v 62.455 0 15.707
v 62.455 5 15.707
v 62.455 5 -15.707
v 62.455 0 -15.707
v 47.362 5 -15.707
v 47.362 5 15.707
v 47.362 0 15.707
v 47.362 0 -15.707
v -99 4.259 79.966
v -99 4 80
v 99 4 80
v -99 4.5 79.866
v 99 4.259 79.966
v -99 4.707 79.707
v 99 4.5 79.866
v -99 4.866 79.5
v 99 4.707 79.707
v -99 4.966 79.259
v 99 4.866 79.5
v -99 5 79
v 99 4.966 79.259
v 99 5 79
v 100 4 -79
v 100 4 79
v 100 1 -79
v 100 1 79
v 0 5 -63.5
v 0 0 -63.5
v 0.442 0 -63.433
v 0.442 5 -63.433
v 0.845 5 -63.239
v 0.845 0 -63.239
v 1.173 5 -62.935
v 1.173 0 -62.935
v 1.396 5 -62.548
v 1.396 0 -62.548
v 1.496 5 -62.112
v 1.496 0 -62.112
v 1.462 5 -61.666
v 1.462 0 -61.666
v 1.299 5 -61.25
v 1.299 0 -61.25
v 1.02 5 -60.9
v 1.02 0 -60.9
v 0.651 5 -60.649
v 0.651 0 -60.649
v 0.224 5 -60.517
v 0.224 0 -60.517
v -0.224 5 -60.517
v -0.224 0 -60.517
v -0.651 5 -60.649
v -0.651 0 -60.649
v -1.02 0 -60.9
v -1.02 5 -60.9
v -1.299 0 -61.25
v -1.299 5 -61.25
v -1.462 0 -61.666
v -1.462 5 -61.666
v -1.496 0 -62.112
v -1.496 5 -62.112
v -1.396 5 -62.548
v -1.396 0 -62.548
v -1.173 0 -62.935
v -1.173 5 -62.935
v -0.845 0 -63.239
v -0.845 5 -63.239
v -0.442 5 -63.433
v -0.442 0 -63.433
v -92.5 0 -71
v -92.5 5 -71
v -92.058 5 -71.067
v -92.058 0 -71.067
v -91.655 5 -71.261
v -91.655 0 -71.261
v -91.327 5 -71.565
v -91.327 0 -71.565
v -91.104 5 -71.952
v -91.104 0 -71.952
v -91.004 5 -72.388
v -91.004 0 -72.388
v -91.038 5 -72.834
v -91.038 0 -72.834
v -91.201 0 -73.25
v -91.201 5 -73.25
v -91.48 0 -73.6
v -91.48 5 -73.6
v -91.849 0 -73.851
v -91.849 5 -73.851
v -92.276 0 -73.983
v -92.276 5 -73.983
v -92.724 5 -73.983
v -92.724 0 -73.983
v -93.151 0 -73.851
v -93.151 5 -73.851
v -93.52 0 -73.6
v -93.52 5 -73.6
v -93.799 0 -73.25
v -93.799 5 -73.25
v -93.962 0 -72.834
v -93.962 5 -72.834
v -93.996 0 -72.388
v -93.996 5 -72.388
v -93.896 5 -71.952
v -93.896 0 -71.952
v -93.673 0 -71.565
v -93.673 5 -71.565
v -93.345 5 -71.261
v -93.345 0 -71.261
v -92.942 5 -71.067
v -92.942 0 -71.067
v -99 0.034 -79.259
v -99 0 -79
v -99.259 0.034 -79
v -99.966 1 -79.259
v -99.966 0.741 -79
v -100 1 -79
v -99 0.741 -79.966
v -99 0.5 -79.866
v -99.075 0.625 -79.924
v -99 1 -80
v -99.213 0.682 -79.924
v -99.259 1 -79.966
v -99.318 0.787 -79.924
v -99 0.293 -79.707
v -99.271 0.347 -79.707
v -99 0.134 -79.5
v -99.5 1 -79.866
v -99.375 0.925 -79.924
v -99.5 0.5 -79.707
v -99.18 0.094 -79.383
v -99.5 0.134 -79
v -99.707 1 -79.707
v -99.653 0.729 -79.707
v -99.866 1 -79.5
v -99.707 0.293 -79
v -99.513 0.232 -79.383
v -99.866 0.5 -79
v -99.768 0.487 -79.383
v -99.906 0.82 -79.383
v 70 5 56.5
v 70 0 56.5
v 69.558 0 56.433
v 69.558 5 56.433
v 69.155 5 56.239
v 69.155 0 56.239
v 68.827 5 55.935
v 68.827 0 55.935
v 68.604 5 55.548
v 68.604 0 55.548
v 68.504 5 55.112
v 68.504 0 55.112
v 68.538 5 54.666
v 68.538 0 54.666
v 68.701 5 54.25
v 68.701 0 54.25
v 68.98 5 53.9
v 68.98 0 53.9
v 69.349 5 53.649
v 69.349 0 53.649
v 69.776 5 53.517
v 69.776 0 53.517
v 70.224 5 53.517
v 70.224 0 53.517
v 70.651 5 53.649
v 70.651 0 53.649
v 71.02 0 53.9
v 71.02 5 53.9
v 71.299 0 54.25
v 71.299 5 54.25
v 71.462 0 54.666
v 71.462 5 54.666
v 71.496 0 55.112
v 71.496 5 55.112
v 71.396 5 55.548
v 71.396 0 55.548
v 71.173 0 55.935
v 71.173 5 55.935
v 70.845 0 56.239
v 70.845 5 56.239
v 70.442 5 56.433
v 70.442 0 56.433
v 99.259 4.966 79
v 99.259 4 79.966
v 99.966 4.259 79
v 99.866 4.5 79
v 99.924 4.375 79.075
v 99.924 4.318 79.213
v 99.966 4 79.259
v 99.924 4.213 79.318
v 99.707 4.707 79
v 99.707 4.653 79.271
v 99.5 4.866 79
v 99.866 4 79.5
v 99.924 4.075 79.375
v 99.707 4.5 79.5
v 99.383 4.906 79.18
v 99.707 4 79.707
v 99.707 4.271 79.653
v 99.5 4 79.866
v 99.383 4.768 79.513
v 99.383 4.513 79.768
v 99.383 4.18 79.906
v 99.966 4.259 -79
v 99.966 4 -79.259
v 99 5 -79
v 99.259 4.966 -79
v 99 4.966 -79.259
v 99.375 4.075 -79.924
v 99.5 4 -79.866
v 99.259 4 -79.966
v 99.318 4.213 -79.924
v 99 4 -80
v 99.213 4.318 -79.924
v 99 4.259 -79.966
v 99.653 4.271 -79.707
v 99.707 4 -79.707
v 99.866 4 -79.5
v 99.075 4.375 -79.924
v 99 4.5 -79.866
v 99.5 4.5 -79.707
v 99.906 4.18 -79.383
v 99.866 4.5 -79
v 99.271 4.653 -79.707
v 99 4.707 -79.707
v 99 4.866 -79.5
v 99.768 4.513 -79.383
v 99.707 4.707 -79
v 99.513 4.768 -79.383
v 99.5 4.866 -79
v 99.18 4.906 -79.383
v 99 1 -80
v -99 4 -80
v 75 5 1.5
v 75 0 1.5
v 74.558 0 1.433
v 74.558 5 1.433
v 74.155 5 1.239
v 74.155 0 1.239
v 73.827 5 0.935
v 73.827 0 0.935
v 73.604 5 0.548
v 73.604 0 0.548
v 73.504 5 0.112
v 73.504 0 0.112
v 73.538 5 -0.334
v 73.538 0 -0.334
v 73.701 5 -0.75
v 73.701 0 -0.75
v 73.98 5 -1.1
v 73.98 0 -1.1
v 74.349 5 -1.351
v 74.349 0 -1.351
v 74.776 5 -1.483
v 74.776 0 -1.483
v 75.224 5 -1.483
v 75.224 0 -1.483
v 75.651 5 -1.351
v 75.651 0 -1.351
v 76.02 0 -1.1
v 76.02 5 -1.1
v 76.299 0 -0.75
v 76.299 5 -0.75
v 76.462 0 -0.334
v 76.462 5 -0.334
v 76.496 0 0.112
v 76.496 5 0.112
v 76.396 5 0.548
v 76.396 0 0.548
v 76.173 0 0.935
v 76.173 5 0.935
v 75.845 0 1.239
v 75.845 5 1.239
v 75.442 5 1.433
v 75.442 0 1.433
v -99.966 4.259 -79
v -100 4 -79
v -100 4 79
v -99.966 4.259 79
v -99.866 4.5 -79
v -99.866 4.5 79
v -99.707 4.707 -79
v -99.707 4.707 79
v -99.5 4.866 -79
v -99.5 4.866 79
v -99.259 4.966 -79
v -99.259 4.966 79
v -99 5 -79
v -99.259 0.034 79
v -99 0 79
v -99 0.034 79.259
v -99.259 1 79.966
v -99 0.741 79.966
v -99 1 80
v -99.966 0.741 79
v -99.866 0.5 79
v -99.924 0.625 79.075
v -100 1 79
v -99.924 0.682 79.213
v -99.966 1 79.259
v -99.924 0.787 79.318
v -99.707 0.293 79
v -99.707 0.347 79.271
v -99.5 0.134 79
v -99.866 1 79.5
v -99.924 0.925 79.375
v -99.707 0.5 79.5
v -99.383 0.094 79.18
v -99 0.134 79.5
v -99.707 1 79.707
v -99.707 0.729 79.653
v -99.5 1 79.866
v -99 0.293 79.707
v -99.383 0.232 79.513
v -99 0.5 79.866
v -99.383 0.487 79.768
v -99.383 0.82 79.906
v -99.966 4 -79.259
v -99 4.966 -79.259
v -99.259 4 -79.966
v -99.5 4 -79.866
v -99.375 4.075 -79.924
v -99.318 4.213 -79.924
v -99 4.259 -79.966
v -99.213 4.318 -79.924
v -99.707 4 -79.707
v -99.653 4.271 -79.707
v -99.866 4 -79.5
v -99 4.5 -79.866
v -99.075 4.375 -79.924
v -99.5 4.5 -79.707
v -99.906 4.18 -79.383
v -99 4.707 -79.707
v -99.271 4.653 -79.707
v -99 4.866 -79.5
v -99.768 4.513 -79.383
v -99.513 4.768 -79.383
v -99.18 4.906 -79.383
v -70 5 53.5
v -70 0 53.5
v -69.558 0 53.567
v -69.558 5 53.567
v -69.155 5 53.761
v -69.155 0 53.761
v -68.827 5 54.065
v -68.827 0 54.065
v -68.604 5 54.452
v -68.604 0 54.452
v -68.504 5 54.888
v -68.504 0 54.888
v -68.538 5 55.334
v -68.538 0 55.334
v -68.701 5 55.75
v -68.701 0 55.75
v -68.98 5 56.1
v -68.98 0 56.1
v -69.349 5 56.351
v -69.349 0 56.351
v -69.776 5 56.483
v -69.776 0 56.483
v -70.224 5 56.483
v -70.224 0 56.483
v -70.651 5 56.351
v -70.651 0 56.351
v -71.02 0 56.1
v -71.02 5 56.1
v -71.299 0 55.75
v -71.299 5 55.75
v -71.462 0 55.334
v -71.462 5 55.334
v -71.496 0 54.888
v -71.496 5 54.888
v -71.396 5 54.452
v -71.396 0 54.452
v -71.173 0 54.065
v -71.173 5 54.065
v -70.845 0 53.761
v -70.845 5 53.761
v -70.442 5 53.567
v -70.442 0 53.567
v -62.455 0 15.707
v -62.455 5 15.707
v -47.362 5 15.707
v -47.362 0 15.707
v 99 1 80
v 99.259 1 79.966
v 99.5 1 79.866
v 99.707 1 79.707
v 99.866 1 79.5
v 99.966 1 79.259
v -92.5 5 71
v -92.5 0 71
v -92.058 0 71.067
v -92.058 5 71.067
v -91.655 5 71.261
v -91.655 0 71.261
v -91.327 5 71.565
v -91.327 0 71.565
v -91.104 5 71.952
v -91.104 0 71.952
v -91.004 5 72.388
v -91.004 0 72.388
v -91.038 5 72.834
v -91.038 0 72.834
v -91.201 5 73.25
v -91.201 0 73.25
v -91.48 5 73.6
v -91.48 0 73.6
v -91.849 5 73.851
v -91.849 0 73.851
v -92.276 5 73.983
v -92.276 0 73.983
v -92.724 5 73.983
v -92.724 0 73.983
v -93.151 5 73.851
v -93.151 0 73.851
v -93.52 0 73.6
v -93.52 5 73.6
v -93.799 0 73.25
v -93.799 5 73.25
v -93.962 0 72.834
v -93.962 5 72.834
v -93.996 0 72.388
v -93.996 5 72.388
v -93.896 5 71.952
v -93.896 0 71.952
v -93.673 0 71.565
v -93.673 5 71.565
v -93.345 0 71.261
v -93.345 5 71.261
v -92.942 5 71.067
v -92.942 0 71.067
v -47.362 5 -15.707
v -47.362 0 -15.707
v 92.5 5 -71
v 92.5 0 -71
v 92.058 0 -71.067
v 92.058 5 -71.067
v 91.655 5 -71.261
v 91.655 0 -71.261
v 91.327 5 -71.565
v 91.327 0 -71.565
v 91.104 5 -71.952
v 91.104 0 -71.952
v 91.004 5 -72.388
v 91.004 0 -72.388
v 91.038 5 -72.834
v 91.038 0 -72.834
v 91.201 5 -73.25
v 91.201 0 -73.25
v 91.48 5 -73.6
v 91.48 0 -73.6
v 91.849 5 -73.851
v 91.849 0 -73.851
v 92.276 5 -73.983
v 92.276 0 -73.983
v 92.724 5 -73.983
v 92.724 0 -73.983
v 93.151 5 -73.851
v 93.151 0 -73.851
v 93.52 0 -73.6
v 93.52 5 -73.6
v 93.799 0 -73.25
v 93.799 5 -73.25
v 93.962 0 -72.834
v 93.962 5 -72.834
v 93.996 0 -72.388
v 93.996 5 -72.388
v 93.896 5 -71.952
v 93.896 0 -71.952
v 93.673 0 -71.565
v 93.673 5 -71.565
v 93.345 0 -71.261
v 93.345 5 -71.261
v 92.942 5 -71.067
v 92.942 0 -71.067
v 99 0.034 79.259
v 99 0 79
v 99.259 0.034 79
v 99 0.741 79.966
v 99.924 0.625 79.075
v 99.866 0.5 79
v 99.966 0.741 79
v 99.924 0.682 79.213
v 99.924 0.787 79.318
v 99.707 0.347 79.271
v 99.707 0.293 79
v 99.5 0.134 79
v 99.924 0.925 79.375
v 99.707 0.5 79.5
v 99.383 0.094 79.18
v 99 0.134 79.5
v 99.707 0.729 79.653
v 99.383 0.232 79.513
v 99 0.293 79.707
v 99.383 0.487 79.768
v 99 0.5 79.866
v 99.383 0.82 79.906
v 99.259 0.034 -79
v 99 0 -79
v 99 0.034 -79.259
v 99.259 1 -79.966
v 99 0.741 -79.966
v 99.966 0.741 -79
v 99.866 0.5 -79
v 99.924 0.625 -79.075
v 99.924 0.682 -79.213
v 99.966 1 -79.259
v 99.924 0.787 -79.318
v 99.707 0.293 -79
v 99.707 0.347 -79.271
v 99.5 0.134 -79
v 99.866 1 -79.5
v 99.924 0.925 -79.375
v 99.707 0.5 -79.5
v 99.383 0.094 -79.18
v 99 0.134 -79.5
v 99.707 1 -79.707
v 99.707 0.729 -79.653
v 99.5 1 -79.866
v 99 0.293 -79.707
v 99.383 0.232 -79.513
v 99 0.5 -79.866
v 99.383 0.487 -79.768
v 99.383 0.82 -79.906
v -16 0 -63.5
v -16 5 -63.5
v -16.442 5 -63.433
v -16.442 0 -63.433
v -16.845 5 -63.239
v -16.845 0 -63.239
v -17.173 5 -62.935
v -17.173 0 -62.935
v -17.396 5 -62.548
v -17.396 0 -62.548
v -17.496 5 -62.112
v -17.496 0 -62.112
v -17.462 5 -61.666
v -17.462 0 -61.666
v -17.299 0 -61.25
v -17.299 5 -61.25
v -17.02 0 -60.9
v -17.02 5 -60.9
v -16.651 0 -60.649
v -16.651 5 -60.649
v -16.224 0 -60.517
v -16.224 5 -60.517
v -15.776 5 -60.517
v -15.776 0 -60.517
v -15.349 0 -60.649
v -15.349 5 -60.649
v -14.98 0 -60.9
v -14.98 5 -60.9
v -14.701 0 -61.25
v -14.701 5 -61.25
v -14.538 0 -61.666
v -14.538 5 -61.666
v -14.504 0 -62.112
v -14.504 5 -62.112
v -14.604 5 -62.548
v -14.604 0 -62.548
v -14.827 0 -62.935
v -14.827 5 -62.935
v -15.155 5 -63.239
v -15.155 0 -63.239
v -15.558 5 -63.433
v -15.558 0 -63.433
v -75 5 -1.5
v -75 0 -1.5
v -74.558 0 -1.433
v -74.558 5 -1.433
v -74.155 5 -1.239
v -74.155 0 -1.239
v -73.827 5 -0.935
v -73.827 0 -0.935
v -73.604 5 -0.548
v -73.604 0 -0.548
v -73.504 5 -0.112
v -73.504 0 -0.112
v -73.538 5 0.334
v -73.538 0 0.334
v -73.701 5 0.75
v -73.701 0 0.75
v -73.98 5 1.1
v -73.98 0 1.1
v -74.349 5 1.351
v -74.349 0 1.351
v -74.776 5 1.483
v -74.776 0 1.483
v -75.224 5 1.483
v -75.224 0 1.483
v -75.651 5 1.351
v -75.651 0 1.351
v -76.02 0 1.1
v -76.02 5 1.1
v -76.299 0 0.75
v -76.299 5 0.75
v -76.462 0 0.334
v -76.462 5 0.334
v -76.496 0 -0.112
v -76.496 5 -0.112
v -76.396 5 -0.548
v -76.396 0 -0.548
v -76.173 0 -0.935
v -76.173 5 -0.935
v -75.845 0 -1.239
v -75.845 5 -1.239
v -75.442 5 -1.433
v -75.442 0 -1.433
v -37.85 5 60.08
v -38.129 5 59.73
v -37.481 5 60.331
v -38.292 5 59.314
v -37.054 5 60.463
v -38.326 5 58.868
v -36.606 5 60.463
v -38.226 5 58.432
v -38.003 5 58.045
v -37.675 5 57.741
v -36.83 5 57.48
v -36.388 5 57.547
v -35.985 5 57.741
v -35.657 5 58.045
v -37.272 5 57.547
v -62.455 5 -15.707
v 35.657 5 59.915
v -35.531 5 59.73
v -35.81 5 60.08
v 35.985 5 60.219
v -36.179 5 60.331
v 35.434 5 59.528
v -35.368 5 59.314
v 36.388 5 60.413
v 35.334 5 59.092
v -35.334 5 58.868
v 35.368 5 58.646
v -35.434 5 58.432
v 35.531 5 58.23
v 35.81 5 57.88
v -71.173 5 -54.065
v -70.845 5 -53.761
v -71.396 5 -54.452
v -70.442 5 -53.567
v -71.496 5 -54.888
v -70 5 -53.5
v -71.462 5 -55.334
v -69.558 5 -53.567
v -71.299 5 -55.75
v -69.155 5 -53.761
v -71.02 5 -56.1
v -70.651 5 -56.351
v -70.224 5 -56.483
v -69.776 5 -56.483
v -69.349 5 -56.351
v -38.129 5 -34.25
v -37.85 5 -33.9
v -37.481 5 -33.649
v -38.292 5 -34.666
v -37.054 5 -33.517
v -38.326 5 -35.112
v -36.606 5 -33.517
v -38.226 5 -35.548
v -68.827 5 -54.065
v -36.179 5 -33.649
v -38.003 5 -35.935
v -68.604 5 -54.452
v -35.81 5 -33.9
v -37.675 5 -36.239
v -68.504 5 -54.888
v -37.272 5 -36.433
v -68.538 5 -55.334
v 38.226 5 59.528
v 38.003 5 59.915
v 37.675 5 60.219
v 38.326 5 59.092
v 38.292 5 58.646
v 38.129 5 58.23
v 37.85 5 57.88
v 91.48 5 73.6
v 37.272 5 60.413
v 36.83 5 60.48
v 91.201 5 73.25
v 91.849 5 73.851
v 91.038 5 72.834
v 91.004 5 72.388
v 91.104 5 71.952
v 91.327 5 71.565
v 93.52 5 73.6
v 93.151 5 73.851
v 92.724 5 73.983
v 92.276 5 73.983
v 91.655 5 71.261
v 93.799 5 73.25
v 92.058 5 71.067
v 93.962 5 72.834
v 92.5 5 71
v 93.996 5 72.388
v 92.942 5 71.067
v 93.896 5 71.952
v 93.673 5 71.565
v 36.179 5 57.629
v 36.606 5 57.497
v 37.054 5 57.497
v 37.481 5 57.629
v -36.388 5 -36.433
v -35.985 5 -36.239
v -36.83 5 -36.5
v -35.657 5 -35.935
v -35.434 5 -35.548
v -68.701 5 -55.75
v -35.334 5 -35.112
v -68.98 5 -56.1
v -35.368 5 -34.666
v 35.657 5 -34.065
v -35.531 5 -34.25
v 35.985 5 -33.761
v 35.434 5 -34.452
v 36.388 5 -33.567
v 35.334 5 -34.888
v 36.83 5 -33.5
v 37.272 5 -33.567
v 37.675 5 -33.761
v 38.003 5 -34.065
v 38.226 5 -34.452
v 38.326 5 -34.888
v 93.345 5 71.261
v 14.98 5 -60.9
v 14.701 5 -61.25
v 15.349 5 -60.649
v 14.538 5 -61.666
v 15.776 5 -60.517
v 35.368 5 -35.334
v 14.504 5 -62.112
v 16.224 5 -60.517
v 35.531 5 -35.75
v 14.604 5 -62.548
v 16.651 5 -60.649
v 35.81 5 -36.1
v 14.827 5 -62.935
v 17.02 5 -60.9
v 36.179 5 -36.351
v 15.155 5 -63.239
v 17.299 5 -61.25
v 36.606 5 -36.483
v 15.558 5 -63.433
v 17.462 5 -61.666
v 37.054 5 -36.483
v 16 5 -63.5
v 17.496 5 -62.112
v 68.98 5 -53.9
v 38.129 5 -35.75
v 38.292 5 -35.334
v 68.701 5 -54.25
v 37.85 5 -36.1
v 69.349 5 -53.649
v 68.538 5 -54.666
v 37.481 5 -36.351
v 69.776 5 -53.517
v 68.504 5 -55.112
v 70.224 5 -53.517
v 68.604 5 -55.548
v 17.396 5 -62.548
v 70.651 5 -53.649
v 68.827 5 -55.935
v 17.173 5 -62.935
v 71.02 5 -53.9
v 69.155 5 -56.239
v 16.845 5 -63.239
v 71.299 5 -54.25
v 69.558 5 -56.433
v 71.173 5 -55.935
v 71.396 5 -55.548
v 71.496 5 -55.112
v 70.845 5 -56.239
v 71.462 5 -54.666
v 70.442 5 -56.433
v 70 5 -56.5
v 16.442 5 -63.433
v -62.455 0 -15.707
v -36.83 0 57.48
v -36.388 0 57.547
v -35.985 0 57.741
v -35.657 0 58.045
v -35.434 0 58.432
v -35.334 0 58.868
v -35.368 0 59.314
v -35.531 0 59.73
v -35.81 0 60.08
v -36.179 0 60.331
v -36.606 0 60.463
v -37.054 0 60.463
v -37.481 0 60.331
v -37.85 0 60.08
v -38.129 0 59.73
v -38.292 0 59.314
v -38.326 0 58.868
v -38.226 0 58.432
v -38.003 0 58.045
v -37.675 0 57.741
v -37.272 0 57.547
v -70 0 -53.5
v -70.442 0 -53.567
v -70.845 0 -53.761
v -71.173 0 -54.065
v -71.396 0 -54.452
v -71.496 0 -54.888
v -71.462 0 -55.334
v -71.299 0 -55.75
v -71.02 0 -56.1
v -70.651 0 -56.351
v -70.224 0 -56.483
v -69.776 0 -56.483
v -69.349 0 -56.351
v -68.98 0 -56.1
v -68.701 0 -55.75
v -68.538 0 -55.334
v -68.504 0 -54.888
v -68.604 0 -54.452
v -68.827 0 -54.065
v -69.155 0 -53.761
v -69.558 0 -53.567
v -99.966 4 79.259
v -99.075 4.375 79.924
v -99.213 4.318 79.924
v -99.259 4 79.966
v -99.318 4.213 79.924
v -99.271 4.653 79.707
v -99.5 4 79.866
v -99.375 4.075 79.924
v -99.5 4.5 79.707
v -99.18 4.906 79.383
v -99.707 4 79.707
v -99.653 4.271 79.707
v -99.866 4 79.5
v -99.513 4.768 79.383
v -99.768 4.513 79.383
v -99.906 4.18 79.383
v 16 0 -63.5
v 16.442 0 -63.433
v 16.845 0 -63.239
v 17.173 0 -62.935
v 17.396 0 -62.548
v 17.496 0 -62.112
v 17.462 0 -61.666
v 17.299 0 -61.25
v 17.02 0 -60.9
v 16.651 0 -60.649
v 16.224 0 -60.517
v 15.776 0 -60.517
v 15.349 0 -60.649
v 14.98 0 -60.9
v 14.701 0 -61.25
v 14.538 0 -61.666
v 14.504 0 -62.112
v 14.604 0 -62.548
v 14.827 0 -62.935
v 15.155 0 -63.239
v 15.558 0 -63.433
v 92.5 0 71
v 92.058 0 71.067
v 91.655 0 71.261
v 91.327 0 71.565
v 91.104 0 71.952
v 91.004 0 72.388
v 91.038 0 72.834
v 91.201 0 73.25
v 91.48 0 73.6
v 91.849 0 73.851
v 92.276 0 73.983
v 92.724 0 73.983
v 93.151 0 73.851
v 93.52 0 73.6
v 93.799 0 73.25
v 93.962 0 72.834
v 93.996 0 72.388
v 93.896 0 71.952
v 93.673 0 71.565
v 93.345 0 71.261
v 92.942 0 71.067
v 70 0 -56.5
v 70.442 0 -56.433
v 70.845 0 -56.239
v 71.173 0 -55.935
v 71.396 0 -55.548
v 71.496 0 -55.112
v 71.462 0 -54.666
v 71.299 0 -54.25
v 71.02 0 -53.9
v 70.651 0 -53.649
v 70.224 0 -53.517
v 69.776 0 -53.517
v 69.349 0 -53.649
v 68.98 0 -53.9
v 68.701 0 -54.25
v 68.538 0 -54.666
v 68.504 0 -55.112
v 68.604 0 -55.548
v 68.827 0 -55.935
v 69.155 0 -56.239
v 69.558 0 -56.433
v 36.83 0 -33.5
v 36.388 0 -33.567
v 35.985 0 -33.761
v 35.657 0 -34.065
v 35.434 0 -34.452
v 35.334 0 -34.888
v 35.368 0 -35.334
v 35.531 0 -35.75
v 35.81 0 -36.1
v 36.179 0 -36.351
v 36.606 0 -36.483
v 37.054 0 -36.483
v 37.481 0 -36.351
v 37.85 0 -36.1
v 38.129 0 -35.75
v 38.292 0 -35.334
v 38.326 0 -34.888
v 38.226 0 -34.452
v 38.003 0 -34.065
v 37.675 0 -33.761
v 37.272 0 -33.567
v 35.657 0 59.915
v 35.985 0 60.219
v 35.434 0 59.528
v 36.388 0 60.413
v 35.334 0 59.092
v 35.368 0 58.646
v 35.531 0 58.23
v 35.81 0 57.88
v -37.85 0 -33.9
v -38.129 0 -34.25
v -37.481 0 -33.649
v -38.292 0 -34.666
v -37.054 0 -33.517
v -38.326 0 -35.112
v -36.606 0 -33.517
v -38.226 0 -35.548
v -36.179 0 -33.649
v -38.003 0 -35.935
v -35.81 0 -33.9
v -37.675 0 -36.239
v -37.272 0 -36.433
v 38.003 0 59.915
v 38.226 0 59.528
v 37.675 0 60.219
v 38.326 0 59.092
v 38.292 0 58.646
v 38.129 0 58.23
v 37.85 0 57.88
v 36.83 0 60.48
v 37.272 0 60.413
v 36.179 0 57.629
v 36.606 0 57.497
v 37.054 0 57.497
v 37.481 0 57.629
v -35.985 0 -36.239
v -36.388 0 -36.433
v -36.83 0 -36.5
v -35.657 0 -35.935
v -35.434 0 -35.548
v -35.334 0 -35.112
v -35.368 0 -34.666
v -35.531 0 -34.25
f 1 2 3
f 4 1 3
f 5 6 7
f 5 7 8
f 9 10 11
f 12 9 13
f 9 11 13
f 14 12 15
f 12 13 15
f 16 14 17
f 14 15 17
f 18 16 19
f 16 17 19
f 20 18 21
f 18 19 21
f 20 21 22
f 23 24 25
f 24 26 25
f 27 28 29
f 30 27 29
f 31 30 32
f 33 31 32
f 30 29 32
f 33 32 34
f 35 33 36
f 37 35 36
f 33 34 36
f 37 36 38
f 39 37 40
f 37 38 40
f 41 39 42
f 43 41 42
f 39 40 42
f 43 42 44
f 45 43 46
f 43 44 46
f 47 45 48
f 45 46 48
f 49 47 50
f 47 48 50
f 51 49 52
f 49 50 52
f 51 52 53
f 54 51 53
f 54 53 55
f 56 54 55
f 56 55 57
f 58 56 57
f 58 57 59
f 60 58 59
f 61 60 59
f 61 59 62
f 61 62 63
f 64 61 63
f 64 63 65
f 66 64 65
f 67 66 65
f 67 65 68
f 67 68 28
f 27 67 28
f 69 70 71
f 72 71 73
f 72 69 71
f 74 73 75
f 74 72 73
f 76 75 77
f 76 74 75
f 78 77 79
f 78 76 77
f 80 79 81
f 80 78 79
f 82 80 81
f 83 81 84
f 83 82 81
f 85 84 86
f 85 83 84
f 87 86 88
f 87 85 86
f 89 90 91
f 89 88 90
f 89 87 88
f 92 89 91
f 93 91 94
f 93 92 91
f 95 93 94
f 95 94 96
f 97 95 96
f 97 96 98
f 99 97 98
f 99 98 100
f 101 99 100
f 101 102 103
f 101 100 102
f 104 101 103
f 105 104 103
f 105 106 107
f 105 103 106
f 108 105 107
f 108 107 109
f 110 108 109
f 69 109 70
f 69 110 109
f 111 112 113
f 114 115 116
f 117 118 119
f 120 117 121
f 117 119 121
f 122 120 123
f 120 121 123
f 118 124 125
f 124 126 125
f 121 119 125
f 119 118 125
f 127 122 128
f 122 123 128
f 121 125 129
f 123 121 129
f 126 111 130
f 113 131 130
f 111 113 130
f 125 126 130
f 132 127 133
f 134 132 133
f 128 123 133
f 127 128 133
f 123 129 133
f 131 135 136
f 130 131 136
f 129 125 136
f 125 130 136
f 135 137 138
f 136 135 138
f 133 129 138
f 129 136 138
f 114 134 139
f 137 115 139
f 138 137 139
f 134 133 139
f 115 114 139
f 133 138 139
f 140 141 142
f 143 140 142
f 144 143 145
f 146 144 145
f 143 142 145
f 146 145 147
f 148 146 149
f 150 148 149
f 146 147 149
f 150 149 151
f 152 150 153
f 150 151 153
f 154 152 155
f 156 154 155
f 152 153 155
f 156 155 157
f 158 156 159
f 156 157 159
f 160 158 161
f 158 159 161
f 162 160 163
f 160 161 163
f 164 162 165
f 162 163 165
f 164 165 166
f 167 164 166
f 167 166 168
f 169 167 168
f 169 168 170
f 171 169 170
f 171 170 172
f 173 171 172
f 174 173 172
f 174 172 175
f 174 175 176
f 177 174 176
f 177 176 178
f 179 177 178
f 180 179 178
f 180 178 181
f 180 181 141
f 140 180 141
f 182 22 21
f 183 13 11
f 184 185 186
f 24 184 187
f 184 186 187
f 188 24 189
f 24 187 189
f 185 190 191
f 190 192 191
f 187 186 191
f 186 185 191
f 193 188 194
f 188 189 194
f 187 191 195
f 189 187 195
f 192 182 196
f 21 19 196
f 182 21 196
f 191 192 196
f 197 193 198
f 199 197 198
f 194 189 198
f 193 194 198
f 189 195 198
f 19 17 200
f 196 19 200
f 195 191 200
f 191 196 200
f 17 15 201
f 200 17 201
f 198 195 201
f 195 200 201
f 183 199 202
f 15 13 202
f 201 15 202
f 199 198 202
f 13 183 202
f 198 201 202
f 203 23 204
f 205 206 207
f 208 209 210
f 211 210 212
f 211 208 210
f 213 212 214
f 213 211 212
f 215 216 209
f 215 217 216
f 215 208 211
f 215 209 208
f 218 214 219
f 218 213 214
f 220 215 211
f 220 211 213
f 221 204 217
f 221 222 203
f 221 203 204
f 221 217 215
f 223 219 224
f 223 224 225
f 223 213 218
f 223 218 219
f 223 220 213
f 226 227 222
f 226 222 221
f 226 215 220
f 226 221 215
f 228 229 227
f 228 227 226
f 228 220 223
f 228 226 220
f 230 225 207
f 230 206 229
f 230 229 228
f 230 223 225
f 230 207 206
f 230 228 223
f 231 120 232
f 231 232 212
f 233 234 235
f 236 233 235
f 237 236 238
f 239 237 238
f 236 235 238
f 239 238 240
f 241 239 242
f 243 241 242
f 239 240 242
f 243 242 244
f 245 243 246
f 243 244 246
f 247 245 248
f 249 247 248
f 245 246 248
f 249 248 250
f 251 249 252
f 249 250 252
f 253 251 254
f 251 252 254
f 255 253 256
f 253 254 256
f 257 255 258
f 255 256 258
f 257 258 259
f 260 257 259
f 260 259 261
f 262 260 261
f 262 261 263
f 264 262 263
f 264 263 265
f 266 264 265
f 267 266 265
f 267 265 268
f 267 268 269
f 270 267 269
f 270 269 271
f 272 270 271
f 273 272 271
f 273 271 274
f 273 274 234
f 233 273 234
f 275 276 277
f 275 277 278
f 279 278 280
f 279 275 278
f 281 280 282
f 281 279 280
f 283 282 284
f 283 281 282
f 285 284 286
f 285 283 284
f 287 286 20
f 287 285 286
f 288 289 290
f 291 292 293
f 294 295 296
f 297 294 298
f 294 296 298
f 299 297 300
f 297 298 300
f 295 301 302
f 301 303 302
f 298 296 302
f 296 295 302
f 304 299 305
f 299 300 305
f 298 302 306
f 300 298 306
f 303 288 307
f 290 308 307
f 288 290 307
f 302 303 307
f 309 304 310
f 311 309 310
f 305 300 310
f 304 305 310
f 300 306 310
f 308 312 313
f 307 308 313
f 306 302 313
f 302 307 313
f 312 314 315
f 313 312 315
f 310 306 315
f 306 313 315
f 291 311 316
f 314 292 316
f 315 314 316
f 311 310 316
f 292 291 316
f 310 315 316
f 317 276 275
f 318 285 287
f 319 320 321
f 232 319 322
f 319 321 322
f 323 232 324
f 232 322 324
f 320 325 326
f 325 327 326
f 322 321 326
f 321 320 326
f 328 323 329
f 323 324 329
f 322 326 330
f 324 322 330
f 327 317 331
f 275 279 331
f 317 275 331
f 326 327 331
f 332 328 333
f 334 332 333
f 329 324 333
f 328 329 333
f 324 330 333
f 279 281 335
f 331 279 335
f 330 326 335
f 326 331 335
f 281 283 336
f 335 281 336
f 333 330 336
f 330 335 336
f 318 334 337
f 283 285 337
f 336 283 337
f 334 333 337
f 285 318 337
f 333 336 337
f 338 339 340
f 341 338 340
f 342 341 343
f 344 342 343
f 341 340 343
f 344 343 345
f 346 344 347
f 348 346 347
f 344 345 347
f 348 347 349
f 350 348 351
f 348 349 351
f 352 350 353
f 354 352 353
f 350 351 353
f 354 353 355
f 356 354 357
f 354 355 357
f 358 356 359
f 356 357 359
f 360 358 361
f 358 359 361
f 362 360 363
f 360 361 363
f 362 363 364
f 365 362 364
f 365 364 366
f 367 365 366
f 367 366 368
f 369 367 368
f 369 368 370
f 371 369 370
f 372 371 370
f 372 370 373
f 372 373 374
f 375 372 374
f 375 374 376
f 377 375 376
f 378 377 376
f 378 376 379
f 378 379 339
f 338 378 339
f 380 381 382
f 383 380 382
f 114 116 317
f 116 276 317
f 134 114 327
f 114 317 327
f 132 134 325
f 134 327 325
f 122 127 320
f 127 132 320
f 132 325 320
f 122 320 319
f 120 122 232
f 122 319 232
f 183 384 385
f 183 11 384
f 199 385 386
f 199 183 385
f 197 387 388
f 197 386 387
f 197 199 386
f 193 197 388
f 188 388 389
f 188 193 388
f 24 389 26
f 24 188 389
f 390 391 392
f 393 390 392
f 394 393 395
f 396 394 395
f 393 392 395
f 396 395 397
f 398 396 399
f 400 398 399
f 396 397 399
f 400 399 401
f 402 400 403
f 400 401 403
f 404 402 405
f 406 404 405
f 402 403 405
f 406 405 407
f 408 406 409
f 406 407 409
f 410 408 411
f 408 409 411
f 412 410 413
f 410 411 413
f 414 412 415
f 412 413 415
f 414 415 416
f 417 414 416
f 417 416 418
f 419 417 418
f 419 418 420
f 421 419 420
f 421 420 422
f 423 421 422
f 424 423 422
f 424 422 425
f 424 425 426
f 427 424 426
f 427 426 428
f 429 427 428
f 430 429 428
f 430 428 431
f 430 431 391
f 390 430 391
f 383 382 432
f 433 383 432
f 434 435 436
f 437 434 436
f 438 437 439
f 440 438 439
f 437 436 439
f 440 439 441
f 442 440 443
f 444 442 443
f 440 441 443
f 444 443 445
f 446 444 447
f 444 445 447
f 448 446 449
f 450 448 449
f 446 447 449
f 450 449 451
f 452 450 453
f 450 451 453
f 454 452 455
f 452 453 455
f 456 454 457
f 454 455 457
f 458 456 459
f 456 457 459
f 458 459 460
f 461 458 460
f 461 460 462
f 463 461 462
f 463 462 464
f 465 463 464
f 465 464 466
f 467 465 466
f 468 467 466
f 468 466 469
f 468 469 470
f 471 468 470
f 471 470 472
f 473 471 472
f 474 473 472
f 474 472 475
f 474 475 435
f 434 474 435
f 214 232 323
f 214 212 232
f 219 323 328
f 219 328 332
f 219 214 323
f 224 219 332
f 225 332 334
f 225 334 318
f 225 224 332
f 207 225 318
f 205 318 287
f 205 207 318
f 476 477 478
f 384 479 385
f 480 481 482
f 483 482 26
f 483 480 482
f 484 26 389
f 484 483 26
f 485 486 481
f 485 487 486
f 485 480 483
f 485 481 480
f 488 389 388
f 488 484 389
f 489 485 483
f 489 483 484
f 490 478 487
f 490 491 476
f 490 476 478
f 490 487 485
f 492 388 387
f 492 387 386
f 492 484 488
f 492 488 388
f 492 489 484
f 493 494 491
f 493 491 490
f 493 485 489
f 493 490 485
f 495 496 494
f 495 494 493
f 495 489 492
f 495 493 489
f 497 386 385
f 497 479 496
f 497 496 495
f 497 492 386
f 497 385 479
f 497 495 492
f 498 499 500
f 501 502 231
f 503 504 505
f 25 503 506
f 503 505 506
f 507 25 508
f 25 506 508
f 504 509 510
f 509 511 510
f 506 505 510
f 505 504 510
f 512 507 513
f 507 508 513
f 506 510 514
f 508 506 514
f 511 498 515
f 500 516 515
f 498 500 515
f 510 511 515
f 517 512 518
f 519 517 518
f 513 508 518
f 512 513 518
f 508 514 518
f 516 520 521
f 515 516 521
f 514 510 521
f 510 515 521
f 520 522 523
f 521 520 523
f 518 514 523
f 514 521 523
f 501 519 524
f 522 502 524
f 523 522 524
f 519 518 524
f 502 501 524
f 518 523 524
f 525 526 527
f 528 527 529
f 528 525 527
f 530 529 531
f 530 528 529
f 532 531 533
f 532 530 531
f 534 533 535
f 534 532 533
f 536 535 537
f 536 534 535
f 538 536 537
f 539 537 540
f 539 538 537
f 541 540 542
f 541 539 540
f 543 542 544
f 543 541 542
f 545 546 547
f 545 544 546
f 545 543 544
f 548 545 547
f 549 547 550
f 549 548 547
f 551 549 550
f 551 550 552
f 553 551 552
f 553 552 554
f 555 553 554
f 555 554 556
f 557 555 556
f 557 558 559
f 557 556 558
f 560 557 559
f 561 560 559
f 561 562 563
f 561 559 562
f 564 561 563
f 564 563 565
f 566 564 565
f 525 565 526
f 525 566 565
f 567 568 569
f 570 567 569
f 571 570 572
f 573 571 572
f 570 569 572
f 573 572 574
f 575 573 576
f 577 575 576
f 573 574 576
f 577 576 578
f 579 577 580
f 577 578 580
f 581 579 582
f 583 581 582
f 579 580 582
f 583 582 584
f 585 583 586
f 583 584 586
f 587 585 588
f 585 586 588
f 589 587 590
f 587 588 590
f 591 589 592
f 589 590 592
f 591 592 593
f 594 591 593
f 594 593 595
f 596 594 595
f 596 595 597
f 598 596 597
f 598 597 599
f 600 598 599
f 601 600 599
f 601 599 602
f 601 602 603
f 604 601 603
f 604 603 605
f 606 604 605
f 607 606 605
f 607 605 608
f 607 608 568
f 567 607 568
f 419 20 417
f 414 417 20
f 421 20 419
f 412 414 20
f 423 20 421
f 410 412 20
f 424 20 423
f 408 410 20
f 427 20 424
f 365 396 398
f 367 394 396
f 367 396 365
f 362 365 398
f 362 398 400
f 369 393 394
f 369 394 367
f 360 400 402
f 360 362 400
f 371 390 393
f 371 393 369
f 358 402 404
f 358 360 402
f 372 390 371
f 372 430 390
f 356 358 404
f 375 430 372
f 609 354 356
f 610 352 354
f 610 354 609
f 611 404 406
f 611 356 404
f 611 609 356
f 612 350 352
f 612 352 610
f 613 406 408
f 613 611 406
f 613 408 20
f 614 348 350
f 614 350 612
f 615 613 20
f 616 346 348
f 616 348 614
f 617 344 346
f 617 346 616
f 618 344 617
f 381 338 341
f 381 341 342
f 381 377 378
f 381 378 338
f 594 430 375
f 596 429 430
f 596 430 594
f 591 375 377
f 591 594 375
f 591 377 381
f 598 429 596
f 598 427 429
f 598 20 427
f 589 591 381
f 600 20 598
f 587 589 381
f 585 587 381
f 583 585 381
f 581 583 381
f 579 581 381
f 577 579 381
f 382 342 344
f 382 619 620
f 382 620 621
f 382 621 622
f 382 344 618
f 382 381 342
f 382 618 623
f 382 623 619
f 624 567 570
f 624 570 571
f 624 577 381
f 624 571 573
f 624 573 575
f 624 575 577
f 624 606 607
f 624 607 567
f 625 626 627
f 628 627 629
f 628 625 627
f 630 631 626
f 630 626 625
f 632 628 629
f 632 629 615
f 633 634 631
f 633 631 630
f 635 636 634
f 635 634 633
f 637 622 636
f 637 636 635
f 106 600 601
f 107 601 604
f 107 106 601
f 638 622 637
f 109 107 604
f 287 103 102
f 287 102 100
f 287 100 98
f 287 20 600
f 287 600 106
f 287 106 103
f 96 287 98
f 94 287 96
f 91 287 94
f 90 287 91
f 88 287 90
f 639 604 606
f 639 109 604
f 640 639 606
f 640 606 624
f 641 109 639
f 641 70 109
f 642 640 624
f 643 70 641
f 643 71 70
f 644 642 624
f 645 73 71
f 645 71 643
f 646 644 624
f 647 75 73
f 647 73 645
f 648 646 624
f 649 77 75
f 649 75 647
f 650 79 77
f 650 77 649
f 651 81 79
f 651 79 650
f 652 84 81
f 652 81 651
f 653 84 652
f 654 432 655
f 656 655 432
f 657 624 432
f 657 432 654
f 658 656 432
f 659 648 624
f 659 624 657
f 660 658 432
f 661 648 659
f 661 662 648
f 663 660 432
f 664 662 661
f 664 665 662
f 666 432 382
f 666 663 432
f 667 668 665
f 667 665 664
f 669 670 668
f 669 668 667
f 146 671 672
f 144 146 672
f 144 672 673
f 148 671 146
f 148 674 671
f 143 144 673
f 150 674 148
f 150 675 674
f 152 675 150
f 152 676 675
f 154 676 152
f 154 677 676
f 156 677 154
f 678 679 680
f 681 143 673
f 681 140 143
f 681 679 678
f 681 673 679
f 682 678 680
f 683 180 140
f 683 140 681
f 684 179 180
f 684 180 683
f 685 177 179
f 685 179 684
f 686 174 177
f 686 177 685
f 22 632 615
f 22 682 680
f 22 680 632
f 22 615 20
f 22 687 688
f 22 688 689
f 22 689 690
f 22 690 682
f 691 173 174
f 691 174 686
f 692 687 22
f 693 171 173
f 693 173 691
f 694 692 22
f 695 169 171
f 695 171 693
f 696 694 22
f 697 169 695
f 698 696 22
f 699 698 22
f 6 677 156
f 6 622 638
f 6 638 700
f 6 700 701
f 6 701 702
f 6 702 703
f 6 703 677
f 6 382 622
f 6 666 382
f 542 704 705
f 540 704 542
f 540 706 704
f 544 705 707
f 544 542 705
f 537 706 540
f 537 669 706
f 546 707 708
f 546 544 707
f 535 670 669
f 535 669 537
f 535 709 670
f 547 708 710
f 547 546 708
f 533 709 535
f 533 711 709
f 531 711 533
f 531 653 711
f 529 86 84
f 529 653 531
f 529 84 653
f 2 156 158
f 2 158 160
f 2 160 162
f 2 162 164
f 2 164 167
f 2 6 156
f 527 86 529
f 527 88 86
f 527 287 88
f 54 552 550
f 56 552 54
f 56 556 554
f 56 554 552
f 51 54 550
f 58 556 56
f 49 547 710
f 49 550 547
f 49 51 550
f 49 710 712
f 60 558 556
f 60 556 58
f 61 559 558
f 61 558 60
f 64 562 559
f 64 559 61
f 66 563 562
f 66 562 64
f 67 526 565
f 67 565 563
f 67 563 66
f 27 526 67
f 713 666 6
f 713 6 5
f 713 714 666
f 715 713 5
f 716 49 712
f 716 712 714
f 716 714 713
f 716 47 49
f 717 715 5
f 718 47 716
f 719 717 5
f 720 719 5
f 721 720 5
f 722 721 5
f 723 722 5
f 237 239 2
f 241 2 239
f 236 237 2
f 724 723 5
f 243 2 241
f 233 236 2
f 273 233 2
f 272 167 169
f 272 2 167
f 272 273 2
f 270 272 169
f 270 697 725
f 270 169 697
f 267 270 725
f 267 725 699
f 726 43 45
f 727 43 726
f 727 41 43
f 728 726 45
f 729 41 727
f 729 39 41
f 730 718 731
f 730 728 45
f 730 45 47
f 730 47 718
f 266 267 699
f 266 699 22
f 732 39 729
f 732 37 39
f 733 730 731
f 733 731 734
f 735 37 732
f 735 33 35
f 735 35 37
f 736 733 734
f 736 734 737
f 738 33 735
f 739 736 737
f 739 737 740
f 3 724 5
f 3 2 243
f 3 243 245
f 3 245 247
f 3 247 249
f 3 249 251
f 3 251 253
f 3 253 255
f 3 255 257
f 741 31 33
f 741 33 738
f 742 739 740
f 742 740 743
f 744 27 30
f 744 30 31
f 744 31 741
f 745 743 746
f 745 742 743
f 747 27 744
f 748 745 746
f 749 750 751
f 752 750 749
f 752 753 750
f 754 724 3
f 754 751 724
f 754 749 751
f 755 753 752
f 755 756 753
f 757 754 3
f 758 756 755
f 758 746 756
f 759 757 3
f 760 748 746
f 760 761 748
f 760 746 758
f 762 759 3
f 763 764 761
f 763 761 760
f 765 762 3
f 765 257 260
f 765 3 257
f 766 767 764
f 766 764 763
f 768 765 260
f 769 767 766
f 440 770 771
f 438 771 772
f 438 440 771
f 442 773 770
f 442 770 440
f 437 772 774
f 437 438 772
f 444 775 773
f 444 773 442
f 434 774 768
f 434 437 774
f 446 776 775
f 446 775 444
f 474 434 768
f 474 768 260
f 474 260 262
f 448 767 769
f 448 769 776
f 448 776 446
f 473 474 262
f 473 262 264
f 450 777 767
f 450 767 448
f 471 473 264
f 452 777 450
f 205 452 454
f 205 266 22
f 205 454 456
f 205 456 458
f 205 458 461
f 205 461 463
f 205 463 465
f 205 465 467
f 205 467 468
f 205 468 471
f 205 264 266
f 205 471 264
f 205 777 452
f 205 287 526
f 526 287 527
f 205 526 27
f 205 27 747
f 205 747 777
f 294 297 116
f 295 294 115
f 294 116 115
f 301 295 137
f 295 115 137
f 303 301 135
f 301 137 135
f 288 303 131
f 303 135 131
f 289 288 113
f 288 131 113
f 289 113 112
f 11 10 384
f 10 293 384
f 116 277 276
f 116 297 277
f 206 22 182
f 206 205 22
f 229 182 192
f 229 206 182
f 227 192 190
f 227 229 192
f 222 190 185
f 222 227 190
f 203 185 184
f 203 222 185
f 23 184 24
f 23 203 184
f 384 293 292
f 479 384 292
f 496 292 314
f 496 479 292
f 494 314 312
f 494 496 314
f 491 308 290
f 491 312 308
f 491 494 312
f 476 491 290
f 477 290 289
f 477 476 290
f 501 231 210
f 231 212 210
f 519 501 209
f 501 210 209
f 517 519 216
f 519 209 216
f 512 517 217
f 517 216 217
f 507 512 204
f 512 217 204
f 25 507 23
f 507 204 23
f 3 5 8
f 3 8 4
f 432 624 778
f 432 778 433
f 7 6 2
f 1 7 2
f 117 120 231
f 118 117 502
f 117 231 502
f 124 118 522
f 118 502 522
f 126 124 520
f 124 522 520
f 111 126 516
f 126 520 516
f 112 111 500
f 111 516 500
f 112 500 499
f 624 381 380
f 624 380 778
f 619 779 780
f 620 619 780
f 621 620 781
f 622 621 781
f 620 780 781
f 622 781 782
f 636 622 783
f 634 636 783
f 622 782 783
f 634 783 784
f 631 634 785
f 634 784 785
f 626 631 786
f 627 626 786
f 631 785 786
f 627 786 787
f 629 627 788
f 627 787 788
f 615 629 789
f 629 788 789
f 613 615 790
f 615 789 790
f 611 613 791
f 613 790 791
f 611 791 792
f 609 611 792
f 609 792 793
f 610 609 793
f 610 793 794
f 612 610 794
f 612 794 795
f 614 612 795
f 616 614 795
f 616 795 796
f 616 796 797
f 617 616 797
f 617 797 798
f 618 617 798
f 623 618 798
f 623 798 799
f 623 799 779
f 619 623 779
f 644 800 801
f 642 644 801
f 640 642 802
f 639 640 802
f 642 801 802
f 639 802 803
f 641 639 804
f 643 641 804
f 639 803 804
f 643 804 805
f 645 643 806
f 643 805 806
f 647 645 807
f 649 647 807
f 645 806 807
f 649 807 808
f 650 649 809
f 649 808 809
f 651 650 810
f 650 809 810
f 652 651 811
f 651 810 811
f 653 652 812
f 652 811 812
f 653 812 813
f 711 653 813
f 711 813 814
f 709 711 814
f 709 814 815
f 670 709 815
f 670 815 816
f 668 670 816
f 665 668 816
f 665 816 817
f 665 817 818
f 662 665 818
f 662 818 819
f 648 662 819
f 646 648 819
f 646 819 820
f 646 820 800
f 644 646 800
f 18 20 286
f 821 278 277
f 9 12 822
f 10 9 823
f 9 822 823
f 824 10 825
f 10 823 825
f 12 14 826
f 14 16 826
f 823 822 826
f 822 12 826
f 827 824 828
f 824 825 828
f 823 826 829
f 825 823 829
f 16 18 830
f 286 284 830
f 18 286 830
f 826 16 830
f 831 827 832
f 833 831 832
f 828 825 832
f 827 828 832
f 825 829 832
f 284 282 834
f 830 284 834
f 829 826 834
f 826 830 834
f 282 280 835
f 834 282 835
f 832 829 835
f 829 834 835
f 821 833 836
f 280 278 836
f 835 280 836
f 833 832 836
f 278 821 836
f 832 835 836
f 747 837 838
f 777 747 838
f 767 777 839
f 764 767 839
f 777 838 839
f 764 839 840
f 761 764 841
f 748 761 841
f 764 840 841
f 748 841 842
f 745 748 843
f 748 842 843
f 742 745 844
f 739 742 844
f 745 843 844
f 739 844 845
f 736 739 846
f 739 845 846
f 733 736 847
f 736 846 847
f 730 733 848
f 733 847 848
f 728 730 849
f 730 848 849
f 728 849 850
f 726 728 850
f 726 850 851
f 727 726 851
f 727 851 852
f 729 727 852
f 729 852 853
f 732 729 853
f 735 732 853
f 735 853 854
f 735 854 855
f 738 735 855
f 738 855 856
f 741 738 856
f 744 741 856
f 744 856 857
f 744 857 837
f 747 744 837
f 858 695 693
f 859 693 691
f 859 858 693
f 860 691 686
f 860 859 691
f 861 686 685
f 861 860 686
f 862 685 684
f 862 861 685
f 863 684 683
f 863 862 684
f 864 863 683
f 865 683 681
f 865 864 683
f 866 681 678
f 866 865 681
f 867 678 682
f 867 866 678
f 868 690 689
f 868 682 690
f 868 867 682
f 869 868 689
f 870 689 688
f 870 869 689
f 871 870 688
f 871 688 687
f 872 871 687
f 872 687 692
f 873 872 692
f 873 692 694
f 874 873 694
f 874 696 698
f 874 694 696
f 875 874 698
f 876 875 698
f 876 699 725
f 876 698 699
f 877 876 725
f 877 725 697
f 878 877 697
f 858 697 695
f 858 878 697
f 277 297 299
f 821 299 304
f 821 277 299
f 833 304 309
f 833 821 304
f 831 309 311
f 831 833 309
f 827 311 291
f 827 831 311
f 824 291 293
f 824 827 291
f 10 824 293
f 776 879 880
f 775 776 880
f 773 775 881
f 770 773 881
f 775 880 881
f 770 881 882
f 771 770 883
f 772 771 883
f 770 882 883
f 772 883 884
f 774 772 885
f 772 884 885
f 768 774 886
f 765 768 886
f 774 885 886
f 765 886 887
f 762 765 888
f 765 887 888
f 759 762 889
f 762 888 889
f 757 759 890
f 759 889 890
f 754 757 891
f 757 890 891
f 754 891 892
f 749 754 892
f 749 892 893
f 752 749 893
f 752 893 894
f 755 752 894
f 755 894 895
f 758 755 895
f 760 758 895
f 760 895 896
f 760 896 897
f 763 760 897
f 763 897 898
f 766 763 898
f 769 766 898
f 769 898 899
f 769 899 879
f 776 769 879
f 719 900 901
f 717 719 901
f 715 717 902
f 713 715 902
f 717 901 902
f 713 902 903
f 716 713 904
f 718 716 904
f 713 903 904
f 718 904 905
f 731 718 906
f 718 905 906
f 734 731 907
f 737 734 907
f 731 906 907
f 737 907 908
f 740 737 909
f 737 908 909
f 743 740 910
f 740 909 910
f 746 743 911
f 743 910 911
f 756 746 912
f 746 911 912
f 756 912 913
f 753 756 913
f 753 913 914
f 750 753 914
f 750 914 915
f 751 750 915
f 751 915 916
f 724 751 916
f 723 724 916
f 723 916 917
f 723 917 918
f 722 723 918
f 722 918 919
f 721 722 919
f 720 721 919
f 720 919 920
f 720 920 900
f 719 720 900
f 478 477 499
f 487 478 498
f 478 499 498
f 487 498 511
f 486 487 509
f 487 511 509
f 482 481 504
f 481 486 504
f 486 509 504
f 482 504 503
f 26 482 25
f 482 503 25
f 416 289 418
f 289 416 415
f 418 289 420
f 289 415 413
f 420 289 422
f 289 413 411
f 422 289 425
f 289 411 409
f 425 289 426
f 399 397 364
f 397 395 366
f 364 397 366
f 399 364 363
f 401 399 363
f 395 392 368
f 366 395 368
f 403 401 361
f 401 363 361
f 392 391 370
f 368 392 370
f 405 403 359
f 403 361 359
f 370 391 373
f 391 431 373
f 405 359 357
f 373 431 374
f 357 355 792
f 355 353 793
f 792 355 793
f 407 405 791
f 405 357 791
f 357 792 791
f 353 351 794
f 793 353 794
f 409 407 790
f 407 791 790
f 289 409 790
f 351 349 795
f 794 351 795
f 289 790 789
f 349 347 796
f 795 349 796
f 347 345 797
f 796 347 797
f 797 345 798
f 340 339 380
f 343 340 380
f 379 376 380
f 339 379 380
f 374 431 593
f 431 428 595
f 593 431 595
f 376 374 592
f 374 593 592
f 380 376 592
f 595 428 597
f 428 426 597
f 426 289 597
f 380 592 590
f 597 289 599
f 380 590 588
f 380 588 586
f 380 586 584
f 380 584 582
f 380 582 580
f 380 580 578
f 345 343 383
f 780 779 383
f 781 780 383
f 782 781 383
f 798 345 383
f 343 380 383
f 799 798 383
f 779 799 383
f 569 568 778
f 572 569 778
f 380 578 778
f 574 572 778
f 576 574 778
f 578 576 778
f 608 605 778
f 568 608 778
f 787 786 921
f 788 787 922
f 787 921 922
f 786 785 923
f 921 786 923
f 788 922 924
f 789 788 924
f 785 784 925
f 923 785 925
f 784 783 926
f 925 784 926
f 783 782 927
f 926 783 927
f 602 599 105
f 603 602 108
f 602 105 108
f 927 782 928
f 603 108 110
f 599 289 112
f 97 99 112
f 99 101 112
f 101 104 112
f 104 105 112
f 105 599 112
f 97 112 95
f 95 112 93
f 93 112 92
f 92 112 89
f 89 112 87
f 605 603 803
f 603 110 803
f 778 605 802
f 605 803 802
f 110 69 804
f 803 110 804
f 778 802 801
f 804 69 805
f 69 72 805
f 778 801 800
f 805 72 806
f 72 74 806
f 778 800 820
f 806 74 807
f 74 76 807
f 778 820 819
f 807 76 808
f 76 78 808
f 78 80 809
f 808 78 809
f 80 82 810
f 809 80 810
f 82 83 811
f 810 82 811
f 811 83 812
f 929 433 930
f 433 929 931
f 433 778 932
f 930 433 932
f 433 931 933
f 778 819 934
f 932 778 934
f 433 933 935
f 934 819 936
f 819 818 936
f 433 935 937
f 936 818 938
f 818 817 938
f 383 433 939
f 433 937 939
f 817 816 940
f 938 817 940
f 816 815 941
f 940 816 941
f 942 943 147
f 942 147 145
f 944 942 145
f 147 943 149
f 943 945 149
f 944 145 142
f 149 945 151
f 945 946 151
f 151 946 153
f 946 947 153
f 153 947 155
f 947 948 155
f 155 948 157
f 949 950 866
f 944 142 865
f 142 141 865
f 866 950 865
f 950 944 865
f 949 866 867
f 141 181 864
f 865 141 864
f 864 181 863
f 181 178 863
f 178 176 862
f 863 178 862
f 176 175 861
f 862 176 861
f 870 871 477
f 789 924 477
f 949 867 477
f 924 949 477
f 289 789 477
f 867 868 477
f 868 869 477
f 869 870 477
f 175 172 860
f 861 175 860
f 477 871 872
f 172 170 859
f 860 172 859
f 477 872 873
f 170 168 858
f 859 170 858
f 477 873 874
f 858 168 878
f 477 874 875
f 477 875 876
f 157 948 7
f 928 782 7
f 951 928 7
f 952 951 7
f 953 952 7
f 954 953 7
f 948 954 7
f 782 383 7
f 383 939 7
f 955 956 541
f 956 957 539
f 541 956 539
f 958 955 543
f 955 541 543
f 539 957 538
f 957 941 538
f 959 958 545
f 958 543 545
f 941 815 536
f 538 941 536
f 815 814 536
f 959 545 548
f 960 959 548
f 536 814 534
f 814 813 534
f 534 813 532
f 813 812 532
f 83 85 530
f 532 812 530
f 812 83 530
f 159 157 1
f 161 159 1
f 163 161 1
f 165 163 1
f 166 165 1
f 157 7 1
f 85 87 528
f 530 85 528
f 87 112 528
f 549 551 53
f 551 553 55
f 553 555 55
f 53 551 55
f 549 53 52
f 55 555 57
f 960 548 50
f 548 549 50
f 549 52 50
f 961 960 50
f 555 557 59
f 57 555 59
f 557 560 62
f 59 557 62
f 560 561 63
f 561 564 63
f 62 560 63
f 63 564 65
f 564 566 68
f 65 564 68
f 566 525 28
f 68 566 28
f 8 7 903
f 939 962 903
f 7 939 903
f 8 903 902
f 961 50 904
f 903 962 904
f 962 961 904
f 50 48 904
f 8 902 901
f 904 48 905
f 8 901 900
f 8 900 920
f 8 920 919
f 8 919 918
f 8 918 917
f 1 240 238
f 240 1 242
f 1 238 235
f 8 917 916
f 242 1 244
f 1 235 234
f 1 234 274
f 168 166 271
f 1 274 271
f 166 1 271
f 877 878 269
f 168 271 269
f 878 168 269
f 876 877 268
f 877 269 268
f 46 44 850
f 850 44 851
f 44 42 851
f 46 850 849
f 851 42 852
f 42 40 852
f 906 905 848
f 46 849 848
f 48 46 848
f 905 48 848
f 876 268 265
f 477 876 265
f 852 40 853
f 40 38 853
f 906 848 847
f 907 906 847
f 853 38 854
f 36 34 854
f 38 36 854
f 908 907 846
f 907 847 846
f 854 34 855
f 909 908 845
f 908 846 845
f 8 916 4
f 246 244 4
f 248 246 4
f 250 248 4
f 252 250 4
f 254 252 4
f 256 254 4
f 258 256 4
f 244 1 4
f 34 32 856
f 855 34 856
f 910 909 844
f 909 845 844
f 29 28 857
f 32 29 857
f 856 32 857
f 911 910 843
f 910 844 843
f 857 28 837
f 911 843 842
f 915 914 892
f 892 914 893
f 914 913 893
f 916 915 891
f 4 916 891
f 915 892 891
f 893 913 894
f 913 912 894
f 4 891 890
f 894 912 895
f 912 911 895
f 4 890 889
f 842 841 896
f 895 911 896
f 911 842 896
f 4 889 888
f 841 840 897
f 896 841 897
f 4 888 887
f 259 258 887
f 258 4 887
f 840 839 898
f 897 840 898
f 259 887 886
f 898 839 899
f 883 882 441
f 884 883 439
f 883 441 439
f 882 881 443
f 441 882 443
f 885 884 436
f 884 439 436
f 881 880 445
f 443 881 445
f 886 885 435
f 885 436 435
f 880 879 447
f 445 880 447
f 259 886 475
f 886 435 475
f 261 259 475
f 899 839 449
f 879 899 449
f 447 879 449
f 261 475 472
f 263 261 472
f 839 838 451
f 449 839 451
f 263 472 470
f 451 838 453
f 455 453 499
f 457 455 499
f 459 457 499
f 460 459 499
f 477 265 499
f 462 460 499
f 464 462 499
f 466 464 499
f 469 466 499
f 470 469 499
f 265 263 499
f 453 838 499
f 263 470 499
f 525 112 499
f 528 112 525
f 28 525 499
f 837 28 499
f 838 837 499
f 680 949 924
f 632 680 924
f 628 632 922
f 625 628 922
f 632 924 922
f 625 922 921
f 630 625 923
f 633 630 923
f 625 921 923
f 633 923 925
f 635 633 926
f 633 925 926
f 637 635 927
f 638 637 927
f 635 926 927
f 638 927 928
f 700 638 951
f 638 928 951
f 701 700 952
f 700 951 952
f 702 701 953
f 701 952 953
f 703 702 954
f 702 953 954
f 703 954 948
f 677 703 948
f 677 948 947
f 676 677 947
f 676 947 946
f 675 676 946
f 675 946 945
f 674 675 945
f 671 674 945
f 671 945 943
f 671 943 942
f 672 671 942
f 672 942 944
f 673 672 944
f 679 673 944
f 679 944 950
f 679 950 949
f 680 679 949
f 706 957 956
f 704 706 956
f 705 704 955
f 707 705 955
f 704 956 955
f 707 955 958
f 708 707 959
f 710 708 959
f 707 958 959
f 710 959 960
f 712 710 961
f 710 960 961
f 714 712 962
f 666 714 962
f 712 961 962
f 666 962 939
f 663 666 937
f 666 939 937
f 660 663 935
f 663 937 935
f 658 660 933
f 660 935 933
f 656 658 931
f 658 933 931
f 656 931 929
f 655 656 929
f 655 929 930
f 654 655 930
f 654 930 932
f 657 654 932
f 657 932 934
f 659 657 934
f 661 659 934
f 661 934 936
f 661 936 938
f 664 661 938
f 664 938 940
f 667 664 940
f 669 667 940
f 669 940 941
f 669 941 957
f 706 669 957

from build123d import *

# Parameters (mm, degrees)
SKETCH7_W               = 200
SKETCH7_H               = 160
BOSS_EXTRUDE5_DEPTH     = 5
SKETCH8_R               = 1.5
CUT_EXTRUDE2_DEPTH      = 129.16005618
MIRROR5_COPY_1_SKETCH_R = 1.5
MIRROR5_COPY_1_DEPTH    = 129.16005618
SKETCH11_R              = 1.5
CUT_EXTRUDE8_DEPTH      = 129.16005618
SKETCH15_R              = 1.5
CUT_EXTRUDE13_DEPTH     = 129.16005618
SKETCH17_R              = 1.5
CUT_EXTRUDE16_DEPTH     = 129.16005618
SKETCH18_R              = 1.5
CUT_EXTRUDE20_DEPTH     = 129.16005618
FILLET1_R               = 1
SKETCH19_W              = 15.093823339
SKETCH19_H              = 31.414282074
CUT_EXTRUDE21_DEPTH     = 129.16005618


with BuildPart() as part:
    # Sketch7 → Boss-Extrude5 (new body)
    with BuildSketch(Plane(origin=(0, 0, 0), x_dir=(1, 0, 0), z_dir=(0, 1, 0))):
        Rectangle(SKETCH7_W, SKETCH7_H)
    extrude(amount=BOSS_EXTRUDE5_DEPTH)

    # Sketch8 → Cut-Extrude2 (cut, through all)
    with BuildSketch(Plane(origin=(0, 0, 0), x_dir=(-1, 0, 0), z_dir=(0, -1, 0))):
        with Locations(Location((92.5, -72.5, 0), (0, 0, 90))):
            Circle(SKETCH8_R)
    cut_extrude2 = extrude(amount=-CUT_EXTRUDE2_DEPTH, mode=Mode.SUBTRACT)

    # Mirror4: Cut-Extrude2 across plane
    add(cut_extrude2.mirror(Plane.XY), mode=Mode.SUBTRACT)

    # Mirror5: Cut-Extrude2 across plane
    add(cut_extrude2.mirror(Plane(origin=(0, 0, 0), x_dir=(0, 0, 1), z_dir=(1, 0, 0))), mode=Mode.SUBTRACT)

    # Mirror5 copy 1 sketch → Mirror5 copy 1 (cut, through all)
    with BuildSketch(Plane.XZ):
        with Locations(Location((92.5, -72.5, 0), (0, 0, 90))):
            Circle(MIRROR5_COPY_1_SKETCH_R)
    extrude(amount=-MIRROR5_COPY_1_DEPTH, mode=Mode.SUBTRACT)

    # Sketch11 → Cut-Extrude8 (cut, through all)
    with BuildSketch(Plane(origin=(0, 0, 0), x_dir=(-1, 0, 0), z_dir=(0, -1, 0))):
        with Locations(Location((36.83, -58.98, 0), (0, 0, 90))):
            Circle(SKETCH11_R)
        with Locations(Location((36.83, 35, 0), (0, 0, 90))):
            Circle(SKETCH11_R)
        with Locations(Location((-36.83, -58.98, 0), (0, 0, 270))):
            Circle(SKETCH11_R)
        with Locations(Location((-36.83, 35, 0), (0, 0, 270))):
            Circle(SKETCH11_R)
    extrude(amount=-CUT_EXTRUDE8_DEPTH, mode=Mode.SUBTRACT)

    # Sketch15 → Cut-Extrude13 (cut, through all)
    with BuildSketch(Plane(origin=(0, 0, 0), x_dir=(-1, 0, 0), z_dir=(0, -1, 0))):
        with Locations(Location((70, -55, 0), (0, 0, 90))):
            Circle(SKETCH15_R)
        with Locations(Location((70, 55, 0), (0, 0, 270))):
            Circle(SKETCH15_R)
        with Locations(Location((-70, 55, 0), (0, 0, 90))):
            Circle(SKETCH15_R)
        with Locations(Location((-70, -55, 0), (0, 0, 270))):
            Circle(SKETCH15_R)
    extrude(amount=-CUT_EXTRUDE13_DEPTH, mode=Mode.SUBTRACT)

    # Sketch17 → Cut-Extrude16 (cut, through all)
    with BuildSketch(Plane(origin=(0, 0, 0), x_dir=(-1, 0, 0), z_dir=(0, -1, 0))):
        with Locations(Location((75, 0, 0), (0, 0, 90))):
            Circle(SKETCH17_R)
        with Locations(Location((-75, 0, 0), (0, 0, 270))):
            Circle(SKETCH17_R)
    extrude(amount=-CUT_EXTRUDE16_DEPTH, mode=Mode.SUBTRACT)

    # Sketch18 → Cut-Extrude20 (cut, through all)
    with BuildSketch(Plane(origin=(0, 0, 0), x_dir=(-1, 0, 0), z_dir=(0, -1, 0))):
        with Locations(Location((0, 62, 0), (0, 0, 90))):
            Circle(SKETCH18_R)
        with Locations(Location((-16, 62, 0), (0, 0, 90))):
            Circle(SKETCH18_R)
    cut_extrude20 = extrude(amount=-CUT_EXTRUDE20_DEPTH, mode=Mode.SUBTRACT)

    # Mirror12: Cut-Extrude20 across plane
    add(cut_extrude20.mirror(Plane(origin=(0, 0, 0), x_dir=(0, 0, 1), z_dir=(1, 0, 0))), mode=Mode.SUBTRACT)

    # Fillet1
    fillet1_edges = [part.edges().sort_by_distance(p)[0] for p in [
        (-100, 5, 0),
        (0, 5, 80),
        (100, 5, 0),
        (0, 0, 80),
        (-100, 0, 0),
        (0, 0, -80),
        (100, 0, 0),
        (100, 2.5, 80),
        (-100, 2.5, 80),
        (-100, 2.5, -80),
        (100, 2.5, -80),
        (0, 5, -80),
    ]]
    fillet(fillet1_edges, radius=FILLET1_R)

    # Sketch19 → Cut-Extrude21 (cut, through all)
    with BuildSketch(Plane(origin=(0, 5, 0), x_dir=(1, 0, 0), z_dir=(0, 1, 0))):
        with Locations((-54.908539981, 0)):
            Rectangle(SKETCH19_W, SKETCH19_H)
        with Locations((54.908539981, 0)):
            Rectangle(SKETCH19_W, SKETCH19_H)
    extrude(amount=-CUT_EXTRUDE21_DEPTH, mode=Mode.SUBTRACT)


solid = part.part
